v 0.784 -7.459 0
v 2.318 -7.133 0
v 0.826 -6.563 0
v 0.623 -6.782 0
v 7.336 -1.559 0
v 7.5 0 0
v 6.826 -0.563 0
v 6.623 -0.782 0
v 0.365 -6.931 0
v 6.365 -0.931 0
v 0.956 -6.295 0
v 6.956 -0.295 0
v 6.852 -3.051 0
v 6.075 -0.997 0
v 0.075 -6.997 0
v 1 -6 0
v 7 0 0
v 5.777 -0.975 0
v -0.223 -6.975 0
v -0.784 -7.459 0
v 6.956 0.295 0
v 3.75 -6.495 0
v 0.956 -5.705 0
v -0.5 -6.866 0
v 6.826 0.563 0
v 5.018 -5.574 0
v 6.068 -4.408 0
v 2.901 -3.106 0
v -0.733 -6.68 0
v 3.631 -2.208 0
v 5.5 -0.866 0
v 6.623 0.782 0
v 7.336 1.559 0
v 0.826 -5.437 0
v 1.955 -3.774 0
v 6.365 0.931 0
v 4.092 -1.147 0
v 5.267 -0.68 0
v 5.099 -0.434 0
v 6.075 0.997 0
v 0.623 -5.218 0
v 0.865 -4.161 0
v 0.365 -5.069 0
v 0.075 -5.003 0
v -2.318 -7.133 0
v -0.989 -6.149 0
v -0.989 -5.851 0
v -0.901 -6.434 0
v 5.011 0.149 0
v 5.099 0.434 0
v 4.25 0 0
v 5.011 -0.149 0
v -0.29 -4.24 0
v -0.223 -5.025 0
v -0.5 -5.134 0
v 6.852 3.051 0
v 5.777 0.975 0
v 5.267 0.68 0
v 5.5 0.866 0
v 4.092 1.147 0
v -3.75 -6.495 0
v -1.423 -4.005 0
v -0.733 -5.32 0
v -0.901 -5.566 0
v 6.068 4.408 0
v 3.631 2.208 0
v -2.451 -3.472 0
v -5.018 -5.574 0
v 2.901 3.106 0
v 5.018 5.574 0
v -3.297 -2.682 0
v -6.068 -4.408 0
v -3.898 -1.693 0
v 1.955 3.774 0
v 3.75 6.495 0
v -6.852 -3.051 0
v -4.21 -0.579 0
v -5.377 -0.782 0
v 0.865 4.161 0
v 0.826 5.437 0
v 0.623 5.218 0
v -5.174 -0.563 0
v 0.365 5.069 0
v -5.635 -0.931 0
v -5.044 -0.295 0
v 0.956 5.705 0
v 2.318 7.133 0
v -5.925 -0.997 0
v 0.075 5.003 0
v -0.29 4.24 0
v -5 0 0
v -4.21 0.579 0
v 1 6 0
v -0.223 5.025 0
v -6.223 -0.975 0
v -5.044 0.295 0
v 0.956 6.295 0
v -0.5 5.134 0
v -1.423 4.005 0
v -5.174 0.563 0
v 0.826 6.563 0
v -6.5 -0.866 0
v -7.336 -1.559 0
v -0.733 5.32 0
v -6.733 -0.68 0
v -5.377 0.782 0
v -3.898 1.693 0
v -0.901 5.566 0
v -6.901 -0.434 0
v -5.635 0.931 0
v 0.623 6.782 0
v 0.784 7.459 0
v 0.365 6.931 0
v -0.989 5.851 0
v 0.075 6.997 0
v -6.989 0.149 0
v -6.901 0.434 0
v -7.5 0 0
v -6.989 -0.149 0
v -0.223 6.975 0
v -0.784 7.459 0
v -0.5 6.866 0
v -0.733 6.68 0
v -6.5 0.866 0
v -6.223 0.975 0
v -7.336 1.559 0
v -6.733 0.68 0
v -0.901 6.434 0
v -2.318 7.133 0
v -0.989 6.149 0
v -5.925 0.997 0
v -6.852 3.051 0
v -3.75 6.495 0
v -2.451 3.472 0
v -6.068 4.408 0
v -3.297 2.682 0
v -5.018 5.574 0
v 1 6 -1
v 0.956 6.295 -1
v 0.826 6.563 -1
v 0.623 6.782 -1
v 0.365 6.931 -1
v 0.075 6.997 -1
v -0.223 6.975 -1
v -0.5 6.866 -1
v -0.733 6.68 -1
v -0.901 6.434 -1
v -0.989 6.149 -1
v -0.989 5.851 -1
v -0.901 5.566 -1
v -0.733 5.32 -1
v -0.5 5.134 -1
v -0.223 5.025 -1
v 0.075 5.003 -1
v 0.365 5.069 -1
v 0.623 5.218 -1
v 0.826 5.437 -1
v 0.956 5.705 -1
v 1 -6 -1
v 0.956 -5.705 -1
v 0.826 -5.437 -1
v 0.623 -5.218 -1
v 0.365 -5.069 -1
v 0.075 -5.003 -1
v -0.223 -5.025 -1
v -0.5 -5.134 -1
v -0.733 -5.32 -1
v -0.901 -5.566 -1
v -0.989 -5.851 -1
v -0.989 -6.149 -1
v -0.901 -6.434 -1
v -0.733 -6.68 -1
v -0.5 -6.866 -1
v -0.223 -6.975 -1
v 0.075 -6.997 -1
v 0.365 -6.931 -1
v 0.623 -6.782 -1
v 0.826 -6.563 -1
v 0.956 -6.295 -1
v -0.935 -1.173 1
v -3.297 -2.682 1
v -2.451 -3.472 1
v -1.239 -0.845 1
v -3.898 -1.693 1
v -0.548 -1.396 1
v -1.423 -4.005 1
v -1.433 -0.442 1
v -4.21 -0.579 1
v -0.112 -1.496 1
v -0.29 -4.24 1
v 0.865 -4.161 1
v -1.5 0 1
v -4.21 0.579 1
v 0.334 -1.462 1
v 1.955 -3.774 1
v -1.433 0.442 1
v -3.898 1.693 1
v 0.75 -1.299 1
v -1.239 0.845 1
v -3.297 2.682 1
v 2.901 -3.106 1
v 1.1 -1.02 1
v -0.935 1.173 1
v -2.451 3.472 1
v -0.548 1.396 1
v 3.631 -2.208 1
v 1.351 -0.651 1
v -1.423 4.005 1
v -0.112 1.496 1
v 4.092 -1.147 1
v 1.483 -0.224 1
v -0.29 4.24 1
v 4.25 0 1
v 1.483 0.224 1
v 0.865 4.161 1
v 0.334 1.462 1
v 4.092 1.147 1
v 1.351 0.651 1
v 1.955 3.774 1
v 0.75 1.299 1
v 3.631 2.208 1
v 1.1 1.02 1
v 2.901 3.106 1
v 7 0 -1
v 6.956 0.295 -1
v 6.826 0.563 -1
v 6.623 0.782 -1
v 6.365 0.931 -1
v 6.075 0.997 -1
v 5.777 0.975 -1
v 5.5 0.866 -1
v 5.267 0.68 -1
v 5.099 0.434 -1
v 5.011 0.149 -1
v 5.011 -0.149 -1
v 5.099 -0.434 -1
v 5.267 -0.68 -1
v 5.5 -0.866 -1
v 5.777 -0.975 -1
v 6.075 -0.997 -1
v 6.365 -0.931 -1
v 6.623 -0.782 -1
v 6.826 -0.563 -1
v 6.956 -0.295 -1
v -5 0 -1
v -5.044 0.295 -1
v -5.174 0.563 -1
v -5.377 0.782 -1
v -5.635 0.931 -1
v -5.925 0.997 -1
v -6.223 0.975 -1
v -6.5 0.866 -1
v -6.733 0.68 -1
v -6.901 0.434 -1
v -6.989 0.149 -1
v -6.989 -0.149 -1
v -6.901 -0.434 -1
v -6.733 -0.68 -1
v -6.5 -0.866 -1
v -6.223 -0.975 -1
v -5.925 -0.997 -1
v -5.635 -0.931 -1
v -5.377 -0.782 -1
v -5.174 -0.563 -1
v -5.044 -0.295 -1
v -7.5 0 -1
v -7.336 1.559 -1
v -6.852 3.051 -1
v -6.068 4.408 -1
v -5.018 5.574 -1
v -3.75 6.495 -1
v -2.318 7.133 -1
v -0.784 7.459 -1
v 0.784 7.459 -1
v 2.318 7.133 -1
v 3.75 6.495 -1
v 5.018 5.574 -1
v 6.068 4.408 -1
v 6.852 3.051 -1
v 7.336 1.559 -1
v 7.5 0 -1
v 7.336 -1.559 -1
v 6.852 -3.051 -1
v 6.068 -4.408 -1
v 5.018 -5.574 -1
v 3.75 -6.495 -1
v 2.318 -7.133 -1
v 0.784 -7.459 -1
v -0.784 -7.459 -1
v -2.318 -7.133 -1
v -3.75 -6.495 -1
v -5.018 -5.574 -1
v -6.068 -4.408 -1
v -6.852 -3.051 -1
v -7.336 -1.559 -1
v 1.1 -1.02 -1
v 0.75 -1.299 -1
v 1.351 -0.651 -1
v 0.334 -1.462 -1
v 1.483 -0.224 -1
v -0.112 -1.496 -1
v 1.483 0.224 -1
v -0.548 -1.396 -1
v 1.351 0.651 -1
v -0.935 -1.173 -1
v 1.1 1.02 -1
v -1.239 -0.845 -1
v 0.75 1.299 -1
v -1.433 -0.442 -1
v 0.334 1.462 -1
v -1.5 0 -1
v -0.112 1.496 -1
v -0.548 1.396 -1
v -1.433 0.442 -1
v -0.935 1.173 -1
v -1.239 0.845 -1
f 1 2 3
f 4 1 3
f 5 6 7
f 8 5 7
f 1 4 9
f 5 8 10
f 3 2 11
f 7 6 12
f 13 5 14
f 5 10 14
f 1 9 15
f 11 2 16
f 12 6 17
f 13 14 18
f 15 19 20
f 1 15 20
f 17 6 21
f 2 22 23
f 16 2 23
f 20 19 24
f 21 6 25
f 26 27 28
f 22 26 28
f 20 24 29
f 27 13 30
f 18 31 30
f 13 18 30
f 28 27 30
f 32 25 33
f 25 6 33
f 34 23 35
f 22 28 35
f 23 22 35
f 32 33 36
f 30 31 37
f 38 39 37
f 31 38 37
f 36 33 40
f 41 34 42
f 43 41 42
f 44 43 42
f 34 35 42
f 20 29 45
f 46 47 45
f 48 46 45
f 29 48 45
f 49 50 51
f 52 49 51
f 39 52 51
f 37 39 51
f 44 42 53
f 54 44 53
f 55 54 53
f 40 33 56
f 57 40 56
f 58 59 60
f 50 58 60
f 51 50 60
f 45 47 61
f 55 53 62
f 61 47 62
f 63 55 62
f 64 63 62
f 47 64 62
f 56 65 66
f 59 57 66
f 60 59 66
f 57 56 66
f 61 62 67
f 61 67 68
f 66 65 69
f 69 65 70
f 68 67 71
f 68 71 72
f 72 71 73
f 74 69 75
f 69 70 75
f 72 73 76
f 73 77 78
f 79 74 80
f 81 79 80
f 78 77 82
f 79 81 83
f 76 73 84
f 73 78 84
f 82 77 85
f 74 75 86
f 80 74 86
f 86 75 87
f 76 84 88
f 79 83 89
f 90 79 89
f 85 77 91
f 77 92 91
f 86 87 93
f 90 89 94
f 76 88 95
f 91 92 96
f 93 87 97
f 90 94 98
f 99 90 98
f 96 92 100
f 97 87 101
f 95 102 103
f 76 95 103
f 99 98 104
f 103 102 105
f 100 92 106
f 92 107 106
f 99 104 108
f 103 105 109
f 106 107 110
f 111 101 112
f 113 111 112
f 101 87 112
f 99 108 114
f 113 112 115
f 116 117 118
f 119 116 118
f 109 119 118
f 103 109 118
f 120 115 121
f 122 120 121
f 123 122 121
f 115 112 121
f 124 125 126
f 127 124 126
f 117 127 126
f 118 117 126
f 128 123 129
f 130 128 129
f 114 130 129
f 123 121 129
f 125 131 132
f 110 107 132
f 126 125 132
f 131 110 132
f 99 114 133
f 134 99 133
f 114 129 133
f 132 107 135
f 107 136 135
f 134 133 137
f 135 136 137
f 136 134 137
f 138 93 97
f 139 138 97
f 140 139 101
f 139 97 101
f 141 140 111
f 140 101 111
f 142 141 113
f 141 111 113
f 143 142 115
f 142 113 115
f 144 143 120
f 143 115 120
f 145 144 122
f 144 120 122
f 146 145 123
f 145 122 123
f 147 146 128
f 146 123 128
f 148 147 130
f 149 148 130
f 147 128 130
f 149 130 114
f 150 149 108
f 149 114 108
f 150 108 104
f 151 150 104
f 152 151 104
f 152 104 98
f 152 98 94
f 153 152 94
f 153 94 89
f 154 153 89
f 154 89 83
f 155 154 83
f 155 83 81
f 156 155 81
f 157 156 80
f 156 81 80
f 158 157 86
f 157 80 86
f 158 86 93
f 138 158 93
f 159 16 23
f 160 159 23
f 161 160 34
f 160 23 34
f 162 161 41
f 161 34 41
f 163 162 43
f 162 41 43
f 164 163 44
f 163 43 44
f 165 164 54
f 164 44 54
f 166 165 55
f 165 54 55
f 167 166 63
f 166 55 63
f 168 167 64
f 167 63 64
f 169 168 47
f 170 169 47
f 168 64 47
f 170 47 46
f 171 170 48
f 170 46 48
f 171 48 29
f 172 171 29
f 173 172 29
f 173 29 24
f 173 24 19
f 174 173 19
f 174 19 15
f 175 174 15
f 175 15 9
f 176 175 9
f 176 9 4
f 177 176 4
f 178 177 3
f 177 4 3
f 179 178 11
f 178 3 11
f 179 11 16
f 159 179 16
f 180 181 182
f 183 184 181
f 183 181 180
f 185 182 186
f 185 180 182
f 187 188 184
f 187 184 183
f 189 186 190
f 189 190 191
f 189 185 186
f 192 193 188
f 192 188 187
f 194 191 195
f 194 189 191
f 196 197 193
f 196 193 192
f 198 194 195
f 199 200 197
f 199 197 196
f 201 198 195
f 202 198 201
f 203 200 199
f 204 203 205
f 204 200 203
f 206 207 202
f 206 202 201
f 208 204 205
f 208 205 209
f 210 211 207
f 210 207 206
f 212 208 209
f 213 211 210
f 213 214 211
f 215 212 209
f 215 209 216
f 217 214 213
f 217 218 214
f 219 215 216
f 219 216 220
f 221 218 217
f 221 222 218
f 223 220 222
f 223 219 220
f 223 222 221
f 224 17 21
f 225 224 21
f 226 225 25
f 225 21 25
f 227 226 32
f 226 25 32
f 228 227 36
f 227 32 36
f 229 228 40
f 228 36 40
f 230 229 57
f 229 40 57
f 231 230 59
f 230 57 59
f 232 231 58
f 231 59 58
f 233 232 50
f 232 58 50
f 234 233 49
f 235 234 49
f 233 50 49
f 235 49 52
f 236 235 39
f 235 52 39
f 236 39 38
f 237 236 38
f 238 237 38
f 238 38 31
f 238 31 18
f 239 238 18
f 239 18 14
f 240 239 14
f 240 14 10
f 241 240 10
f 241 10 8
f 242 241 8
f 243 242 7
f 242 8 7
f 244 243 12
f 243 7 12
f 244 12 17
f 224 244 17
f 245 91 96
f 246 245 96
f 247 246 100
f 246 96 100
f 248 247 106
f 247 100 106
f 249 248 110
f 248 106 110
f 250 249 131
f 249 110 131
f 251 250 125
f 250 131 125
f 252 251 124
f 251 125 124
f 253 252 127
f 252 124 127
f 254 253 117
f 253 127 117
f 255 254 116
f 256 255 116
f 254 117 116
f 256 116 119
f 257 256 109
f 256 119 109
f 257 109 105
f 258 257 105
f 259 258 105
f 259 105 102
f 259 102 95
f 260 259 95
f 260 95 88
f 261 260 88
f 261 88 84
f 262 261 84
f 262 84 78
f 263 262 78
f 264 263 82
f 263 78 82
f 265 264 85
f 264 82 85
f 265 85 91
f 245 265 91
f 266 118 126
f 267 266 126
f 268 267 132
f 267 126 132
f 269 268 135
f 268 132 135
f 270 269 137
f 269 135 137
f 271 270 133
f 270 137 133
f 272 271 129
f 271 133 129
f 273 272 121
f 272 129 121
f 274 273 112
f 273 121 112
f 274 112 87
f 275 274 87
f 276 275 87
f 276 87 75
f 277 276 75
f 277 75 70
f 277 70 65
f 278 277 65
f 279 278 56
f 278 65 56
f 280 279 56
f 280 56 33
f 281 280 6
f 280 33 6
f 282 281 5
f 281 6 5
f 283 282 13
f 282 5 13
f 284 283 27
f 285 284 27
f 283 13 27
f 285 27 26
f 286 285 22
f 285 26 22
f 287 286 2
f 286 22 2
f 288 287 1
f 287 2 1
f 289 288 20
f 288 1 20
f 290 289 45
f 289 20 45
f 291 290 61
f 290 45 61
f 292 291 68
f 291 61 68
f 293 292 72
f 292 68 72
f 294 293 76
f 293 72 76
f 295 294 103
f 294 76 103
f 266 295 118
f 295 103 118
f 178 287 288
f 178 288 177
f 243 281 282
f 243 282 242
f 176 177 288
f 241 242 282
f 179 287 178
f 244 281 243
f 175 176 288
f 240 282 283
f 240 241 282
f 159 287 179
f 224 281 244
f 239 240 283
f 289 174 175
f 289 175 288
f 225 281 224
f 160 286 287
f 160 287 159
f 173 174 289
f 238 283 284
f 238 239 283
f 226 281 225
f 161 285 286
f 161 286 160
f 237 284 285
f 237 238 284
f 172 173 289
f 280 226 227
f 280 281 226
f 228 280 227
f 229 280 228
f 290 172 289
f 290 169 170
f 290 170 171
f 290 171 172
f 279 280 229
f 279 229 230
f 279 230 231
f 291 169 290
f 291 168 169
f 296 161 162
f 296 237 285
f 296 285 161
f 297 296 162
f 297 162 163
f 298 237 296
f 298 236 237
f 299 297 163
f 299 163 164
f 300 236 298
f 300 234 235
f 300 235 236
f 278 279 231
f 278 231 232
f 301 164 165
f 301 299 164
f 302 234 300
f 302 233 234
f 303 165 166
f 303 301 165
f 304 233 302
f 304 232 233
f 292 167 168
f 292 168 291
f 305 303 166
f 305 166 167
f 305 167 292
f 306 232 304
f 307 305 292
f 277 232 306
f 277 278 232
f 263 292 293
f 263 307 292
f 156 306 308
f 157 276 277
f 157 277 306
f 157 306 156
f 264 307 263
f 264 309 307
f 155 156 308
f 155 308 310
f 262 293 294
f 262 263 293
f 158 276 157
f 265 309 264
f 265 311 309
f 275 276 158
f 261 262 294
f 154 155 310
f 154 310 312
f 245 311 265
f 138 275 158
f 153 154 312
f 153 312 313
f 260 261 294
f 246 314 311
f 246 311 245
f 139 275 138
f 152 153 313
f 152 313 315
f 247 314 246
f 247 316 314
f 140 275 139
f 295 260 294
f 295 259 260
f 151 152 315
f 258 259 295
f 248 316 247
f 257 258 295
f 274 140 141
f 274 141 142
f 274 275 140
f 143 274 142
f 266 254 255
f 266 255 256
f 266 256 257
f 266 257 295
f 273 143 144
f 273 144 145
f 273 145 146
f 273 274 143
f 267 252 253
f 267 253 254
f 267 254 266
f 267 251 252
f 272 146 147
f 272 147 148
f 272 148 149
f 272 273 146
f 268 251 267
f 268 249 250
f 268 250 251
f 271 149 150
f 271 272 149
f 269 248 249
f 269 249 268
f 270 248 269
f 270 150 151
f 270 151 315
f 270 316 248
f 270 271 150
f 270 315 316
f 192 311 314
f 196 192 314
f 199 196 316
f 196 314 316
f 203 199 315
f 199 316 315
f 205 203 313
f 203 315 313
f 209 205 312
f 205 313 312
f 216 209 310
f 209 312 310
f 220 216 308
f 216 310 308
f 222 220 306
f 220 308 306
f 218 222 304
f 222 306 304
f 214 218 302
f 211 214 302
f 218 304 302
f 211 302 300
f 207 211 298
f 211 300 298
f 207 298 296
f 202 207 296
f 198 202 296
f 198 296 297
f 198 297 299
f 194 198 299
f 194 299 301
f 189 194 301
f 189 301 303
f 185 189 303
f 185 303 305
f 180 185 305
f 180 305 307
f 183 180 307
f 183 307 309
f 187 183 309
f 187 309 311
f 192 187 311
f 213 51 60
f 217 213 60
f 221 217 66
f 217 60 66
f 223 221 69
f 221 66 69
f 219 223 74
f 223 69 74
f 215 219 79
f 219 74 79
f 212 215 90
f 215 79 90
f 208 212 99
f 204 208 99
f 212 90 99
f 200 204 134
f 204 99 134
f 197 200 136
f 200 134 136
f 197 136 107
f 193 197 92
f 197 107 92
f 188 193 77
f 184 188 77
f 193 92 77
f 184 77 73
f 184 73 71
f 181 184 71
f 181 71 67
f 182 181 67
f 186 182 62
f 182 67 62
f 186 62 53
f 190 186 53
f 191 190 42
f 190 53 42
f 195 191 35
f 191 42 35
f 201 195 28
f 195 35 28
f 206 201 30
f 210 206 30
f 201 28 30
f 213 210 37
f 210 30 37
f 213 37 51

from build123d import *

# Parameters (mm, degrees)
SKETCH_1_R          = 4.25
EXTRUDE_1_DEPTH     = 1
SKETCH_2_R          = 7.5
EXTRUDE_2_DEPTH     = 1
SKETCH_3_R          = 1
CUT_EXTRUDE_1_DEPTH = 1
SKETCH_4_R          = 1.5
CUT_EXTRUDE_2_DEPTH = 11.793516572


with BuildPart() as part:
    # 草图1 → 凸台-拉伸1 (new body)
    with BuildSketch(Plane.XY):
        Circle(SKETCH_1_R)
    extrude(amount=EXTRUDE_1_DEPTH)

    # 草图2 → 凸台-拉伸2 (add)
    with BuildSketch(Plane(origin=(0, 0, 0), x_dir=(-1, 0, 0), z_dir=(0, 0, -1))):
        Circle(SKETCH_2_R)
    extrude(amount=EXTRUDE_2_DEPTH)

    # 草图3 → 切除-拉伸1 (cut)
    with BuildSketch(Plane.XY):
        with Locations((6, 0)):
            Circle(SKETCH_3_R)
        with Locations((0, 6)):
            Circle(SKETCH_3_R)
        with Locations((-6, 0)):
            Circle(SKETCH_3_R)
        with Locations((0, -6)):
            Circle(SKETCH_3_R)
    extrude(amount=-CUT_EXTRUDE_1_DEPTH, mode=Mode.SUBTRACT)

    # 草图4 → 切除-拉伸2 (cut, through all)
    with BuildSketch(Plane(origin=(0, 0, -1), x_dir=(-1, 0, 0), z_dir=(0, 0, -1))):
        Circle(SKETCH_4_R)
    extrude(amount=-CUT_EXTRUDE_2_DEPTH, mode=Mode.SUBTRACT)


solid = part.part
